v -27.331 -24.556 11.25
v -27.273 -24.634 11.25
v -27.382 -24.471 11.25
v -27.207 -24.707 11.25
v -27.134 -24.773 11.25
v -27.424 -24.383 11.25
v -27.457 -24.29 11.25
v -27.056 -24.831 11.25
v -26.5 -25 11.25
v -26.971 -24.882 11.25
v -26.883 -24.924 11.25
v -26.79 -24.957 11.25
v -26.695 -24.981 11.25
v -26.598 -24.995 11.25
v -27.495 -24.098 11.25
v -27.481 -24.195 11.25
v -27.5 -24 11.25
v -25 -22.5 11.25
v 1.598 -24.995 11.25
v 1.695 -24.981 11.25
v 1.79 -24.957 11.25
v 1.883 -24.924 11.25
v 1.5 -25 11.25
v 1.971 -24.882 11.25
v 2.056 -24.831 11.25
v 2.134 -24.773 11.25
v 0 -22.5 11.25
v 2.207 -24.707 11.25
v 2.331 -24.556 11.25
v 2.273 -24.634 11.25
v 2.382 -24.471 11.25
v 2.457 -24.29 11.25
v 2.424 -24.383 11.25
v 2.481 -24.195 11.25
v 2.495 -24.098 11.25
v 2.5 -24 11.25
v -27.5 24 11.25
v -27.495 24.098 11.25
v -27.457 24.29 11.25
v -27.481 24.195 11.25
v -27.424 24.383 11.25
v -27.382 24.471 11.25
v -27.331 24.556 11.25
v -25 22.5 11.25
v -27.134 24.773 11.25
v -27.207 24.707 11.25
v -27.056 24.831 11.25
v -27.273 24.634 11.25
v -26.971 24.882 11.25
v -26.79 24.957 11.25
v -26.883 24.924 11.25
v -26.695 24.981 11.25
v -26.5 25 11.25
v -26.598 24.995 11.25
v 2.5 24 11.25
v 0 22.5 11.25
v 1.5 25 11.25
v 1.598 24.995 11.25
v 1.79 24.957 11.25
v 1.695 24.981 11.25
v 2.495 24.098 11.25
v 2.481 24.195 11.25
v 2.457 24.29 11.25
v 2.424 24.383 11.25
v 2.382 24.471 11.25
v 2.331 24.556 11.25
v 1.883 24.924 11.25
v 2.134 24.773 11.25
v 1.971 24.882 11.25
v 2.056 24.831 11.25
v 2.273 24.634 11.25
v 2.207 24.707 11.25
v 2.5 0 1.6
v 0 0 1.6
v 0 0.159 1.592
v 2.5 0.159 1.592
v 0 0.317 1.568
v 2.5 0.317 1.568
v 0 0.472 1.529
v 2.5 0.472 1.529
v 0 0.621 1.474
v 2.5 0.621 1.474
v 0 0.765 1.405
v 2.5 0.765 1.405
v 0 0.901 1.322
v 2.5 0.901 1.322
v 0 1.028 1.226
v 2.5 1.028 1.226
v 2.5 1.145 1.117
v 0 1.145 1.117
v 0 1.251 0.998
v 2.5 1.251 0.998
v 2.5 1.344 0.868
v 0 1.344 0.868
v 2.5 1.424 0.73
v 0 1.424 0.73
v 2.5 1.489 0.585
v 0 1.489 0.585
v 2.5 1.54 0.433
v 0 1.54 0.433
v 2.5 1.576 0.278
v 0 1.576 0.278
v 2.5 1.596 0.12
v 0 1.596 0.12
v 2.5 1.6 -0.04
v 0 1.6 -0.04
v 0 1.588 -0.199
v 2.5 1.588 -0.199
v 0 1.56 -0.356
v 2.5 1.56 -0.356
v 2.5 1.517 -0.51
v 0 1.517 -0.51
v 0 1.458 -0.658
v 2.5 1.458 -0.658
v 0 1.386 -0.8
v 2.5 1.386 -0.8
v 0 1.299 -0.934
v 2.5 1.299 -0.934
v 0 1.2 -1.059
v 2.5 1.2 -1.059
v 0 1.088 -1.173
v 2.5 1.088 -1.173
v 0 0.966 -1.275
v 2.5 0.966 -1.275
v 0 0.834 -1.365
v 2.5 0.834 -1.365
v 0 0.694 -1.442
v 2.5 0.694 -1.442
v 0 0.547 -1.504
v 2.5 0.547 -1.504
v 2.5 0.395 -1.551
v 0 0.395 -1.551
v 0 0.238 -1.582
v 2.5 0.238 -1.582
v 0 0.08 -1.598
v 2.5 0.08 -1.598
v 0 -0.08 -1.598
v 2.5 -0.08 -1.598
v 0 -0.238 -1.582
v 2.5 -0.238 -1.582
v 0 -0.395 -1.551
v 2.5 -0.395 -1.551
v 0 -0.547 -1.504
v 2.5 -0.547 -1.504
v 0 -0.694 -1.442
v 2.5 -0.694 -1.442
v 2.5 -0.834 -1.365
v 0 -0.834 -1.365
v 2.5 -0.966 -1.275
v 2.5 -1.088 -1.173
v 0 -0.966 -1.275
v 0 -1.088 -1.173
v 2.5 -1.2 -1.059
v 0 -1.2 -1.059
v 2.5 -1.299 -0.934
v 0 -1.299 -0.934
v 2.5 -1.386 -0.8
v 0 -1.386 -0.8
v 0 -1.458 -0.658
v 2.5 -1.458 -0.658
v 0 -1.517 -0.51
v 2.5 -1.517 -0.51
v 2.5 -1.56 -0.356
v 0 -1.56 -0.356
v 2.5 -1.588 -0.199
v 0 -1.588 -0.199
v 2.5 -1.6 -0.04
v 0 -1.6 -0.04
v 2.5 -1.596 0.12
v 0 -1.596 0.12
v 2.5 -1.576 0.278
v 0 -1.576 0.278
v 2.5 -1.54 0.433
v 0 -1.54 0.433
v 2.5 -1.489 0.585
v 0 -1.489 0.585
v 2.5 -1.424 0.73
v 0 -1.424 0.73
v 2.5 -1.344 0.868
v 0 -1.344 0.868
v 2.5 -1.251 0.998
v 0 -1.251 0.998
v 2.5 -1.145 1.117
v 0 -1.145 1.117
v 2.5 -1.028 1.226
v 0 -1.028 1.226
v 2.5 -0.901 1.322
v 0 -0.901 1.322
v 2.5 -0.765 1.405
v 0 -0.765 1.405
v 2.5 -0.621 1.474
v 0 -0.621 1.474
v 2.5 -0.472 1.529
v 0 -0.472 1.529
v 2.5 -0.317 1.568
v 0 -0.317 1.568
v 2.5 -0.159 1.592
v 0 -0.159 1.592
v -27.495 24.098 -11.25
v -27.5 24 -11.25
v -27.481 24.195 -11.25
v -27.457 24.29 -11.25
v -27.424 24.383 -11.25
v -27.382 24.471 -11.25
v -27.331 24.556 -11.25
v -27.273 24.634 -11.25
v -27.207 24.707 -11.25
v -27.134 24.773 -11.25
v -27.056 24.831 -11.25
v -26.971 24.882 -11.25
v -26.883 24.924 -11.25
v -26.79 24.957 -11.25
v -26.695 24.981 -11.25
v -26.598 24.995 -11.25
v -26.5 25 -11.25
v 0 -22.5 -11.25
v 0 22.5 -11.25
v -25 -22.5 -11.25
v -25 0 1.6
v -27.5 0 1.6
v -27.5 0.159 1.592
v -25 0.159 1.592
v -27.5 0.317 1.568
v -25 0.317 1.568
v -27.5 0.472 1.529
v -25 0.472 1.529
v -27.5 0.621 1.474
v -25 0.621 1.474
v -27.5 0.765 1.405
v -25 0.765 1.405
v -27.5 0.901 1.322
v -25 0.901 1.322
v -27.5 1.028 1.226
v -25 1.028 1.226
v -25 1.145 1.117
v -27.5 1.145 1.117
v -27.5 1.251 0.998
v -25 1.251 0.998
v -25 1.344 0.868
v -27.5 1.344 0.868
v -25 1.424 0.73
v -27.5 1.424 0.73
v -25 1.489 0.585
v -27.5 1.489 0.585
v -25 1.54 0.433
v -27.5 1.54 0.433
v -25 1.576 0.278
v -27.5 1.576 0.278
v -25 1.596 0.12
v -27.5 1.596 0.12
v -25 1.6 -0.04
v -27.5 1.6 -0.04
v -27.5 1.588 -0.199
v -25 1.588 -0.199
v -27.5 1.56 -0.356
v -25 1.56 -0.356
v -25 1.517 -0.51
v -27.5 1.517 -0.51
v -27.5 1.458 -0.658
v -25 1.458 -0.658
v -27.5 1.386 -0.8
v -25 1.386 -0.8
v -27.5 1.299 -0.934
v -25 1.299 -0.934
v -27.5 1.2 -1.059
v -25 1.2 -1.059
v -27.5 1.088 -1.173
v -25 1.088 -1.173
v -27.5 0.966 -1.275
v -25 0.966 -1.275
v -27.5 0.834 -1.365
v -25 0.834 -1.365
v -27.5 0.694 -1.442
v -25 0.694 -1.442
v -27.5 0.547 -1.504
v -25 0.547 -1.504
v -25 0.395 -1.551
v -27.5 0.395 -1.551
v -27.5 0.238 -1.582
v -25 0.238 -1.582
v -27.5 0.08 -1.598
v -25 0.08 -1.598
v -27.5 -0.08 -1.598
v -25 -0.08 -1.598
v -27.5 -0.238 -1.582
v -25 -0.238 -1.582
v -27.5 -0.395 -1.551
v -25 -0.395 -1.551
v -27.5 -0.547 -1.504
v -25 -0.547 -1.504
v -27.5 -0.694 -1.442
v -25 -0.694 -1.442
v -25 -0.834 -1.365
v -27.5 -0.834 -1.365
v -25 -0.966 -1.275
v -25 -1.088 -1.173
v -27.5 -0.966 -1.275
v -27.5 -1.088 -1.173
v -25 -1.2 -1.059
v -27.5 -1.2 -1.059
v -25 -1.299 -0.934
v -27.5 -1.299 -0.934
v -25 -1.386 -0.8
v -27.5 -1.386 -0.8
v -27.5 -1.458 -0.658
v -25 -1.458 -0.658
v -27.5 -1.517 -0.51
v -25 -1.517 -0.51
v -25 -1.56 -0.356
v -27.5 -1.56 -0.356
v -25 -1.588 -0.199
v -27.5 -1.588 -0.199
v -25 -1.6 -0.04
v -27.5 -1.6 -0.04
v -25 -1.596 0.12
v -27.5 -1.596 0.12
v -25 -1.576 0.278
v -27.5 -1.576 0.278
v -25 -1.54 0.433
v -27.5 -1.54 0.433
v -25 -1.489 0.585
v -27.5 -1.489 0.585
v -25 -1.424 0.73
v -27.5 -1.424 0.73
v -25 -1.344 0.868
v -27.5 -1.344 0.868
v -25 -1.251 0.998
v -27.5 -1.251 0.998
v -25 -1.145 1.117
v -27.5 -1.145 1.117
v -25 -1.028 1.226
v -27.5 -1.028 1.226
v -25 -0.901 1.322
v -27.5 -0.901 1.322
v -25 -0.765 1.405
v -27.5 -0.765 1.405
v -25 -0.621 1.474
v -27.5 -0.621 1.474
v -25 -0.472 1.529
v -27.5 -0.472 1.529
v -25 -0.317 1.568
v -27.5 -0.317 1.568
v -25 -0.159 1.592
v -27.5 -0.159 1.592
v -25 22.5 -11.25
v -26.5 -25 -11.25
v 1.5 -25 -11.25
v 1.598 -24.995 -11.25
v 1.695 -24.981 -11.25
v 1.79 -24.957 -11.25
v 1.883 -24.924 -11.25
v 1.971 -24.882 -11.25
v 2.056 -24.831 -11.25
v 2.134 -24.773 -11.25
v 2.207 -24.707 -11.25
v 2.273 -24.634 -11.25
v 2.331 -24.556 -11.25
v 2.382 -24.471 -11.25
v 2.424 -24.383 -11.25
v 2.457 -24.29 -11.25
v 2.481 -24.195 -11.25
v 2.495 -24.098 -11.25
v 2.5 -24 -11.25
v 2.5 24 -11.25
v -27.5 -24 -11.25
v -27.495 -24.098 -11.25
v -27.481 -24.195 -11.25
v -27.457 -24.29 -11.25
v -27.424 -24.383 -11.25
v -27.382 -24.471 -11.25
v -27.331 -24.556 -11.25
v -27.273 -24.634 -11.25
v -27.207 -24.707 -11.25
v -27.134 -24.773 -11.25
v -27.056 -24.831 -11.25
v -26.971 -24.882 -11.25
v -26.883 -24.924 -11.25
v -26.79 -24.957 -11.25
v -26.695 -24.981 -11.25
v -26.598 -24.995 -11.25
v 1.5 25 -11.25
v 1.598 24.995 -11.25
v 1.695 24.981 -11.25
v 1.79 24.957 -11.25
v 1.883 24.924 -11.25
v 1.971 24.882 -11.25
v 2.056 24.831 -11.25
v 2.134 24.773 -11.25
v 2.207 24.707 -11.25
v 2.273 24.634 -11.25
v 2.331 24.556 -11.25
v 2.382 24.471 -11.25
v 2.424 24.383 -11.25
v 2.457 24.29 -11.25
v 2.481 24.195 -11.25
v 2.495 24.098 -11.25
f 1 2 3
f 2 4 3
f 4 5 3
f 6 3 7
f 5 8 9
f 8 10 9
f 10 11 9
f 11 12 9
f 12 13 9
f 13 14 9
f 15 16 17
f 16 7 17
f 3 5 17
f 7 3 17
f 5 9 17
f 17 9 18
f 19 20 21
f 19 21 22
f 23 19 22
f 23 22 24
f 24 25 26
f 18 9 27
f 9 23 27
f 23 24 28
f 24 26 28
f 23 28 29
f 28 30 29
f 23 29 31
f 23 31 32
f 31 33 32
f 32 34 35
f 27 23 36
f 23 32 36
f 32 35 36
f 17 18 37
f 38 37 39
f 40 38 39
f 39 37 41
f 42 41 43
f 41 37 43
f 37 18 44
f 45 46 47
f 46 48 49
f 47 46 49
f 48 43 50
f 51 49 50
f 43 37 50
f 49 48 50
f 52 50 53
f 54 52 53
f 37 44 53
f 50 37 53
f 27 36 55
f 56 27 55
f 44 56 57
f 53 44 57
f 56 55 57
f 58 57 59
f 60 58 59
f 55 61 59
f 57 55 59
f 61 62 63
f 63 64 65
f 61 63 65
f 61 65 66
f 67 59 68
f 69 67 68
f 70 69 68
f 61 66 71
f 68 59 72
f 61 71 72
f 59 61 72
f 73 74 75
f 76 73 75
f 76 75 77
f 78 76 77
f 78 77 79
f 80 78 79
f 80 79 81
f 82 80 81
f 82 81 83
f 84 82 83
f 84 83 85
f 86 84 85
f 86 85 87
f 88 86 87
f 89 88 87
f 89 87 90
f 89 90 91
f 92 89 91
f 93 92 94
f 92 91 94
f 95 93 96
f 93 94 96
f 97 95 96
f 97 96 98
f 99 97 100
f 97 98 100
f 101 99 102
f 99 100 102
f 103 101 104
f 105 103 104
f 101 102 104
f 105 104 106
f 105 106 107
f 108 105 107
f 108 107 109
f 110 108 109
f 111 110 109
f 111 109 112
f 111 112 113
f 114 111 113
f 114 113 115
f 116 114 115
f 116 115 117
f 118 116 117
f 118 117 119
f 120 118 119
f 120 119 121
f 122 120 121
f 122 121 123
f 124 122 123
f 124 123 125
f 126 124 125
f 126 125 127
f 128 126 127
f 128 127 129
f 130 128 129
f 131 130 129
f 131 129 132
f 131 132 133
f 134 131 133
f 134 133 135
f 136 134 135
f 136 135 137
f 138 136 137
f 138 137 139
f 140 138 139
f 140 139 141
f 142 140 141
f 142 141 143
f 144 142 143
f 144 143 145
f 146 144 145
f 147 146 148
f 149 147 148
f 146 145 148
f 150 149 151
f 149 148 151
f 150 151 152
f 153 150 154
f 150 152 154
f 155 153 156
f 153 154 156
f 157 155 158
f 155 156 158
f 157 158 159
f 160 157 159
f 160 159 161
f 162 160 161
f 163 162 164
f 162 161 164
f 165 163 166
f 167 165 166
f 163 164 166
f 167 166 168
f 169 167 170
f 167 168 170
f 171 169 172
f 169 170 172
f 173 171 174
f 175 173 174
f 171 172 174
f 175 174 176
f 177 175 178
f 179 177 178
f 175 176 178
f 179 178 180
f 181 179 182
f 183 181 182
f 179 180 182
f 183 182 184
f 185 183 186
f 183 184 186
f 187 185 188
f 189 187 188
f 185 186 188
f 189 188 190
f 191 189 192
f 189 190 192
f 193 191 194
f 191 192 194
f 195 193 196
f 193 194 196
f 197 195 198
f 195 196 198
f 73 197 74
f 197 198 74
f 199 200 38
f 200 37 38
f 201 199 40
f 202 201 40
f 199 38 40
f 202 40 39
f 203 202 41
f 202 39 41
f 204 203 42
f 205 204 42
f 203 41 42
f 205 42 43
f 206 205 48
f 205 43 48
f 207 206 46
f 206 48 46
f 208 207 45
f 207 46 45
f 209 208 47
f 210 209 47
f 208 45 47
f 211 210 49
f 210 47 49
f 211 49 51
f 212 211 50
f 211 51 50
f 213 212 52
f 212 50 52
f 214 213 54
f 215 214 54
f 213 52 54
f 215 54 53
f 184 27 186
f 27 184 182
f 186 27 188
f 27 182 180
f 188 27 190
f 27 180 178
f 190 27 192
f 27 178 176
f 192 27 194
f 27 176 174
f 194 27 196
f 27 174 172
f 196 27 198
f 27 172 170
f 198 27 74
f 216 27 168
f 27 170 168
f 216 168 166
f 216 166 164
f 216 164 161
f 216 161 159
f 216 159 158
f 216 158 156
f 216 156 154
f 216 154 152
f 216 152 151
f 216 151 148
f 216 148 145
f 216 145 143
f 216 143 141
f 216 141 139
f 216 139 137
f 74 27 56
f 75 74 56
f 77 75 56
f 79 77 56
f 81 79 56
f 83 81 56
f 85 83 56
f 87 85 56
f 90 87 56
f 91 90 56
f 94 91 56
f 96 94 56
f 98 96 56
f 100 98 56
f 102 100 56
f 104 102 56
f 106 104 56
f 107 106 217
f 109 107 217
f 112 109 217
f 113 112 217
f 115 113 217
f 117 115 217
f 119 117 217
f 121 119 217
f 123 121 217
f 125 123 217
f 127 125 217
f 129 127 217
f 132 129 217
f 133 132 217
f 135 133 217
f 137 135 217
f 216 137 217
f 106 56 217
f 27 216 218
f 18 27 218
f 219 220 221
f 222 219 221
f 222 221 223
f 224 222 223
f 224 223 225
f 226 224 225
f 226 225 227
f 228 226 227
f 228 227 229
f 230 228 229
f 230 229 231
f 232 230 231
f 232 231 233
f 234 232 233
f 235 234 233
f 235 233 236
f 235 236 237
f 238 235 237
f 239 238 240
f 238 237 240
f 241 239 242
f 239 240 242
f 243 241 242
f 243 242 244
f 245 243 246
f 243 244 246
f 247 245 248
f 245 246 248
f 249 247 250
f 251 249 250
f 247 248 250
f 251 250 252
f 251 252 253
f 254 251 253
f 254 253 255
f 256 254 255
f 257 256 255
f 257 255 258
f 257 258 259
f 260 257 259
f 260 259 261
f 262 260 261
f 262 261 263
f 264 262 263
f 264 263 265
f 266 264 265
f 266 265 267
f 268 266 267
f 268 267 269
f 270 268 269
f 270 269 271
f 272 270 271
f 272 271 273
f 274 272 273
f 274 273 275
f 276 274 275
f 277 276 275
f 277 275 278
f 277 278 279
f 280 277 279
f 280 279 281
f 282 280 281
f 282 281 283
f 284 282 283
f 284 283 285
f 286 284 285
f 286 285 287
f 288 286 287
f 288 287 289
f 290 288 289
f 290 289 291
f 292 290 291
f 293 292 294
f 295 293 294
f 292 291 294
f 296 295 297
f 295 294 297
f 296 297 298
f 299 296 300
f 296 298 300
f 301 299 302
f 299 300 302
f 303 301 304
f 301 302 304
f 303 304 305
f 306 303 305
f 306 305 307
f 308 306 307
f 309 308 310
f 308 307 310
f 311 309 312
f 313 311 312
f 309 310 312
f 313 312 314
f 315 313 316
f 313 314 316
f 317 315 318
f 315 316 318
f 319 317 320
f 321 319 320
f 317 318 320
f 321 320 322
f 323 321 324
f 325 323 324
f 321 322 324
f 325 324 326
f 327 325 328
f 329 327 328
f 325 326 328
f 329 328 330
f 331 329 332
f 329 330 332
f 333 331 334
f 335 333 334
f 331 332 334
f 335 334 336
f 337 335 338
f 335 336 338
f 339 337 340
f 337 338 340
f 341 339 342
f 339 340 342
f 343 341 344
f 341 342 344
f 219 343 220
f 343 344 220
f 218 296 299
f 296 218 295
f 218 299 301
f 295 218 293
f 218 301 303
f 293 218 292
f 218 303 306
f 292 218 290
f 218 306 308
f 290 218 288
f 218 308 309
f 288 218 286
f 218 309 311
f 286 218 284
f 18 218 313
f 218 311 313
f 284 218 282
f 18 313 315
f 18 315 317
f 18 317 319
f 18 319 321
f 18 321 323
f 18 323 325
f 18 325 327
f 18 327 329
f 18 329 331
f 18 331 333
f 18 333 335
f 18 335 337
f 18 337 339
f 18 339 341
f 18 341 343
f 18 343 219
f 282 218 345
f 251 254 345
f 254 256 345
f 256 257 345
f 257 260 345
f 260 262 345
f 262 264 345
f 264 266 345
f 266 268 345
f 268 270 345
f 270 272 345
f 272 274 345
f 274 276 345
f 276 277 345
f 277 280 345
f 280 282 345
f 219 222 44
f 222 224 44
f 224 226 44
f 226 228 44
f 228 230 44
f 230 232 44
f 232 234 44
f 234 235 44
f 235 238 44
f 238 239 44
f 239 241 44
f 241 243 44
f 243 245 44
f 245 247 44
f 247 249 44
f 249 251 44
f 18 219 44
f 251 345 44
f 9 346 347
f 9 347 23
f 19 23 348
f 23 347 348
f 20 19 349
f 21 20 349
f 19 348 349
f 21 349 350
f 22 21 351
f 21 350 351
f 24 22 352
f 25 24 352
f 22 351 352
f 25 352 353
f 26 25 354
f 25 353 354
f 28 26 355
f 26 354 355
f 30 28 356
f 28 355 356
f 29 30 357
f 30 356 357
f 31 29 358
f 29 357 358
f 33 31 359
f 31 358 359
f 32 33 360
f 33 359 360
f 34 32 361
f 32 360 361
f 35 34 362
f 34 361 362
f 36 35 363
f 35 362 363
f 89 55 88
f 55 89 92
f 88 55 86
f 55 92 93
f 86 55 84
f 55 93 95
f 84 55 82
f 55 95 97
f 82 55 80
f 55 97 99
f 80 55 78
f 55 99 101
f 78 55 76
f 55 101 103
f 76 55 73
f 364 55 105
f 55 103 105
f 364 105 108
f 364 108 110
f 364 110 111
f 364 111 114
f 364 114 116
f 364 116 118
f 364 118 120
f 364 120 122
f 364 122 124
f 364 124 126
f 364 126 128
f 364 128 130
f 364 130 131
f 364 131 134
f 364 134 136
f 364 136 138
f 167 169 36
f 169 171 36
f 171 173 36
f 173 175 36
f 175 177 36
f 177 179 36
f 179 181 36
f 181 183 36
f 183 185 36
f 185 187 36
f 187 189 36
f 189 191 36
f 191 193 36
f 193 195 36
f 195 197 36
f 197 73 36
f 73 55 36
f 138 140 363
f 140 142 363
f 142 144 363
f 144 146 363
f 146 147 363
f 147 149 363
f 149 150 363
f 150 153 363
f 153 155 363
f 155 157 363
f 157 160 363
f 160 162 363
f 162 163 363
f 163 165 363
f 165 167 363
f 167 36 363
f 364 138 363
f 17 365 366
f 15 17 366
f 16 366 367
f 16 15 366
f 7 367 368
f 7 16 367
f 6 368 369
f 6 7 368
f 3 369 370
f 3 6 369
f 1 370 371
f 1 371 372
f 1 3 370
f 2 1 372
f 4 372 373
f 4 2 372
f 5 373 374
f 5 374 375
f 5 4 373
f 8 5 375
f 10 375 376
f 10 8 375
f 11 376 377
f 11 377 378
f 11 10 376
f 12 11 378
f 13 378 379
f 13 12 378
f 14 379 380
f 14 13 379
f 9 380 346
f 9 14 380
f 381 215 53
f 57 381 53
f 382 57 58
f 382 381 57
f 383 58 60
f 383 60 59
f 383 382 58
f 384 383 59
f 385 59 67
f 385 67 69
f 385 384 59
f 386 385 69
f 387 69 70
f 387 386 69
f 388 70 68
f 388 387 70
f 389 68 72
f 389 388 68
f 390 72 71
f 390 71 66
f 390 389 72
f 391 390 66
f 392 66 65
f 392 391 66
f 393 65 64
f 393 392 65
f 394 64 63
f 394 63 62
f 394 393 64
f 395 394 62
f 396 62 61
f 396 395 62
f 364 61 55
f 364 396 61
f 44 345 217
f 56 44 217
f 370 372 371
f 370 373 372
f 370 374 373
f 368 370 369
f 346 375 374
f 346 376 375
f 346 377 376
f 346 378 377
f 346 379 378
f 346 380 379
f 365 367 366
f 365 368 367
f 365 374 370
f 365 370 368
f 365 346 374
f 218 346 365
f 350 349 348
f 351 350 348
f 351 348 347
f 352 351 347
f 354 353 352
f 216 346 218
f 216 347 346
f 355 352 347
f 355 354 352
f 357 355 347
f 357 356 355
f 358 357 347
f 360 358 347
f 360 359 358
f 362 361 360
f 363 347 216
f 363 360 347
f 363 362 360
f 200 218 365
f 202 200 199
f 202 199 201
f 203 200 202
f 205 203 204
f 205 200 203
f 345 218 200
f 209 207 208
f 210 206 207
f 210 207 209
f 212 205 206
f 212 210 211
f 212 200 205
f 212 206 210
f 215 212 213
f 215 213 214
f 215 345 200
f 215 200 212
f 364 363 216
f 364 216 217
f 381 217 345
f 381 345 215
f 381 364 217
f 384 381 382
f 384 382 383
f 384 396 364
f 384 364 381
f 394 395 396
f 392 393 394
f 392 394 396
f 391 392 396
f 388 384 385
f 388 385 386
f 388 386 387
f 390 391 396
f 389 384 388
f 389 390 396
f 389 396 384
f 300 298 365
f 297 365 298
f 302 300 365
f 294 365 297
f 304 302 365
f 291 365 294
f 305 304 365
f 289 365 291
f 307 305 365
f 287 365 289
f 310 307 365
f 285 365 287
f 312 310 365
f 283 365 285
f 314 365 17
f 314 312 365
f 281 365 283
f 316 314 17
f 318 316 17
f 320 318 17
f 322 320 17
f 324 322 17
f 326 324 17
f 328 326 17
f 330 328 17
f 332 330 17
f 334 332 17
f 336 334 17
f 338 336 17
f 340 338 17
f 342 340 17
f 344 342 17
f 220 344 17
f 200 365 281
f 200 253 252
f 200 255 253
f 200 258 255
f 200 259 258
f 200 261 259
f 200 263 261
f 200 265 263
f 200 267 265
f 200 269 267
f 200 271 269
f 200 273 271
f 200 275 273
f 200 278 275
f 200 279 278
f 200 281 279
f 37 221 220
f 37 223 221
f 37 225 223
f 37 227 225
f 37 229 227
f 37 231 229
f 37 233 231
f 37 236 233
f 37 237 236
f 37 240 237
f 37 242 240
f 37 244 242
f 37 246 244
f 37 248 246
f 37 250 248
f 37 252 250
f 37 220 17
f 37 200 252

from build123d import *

# Parameters (mm, degrees)
SKETCH1_W           = 22.5
SKETCH1_H           = 45
BOSS_EXTRUDE1_DEPTH = 2.5
SKETCH2_W           = 27.5
SKETCH2_H           = 22.5
BOSS_EXTRUDE2_DEPTH = 2.5
SKETCH3_W           = 27.5
SKETCH3_H           = 22.5
BOSS_EXTRUDE3_DEPTH = 2.5
SKETCH4_W           = 22.5
SKETCH4_H           = 50
BOSS_EXTRUDE4_DEPTH = 2.5
SKETCH5_R           = 1.6
CUT_EXTRUDE1_DEPTH  = 30
FILLET2_R           = 1
FILLET3_R           = 1


with BuildPart() as part:
    # Sketch1 → Boss-Extrude1 (new body)
    with BuildSketch(Plane(origin=(0, 0, 0), x_dir=(0, 0, -1), z_dir=(1, 0, 0))):
        Rectangle(SKETCH1_W, SKETCH1_H)
    extrude(amount=BOSS_EXTRUDE1_DEPTH)

    # Sketch2 → Boss-Extrude2 (add)
    with BuildSketch(Plane(origin=(0, -22.5, 0), x_dir=(-1, 0, 0), z_dir=(0, -1, 0))):
        with Locations((11.25, 0)):
            Rectangle(SKETCH2_W, SKETCH2_H)
    extrude(amount=BOSS_EXTRUDE2_DEPTH)

    # Sketch3 → Boss-Extrude3 (add)
    with BuildSketch(Plane(origin=(0, 22.5, 0), x_dir=(1, 0, 0), z_dir=(0, 1, 0))):
        with Locations((-11.25, 0)):
            Rectangle(SKETCH3_W, SKETCH3_H)
    extrude(amount=BOSS_EXTRUDE3_DEPTH)

    # Sketch4 → Boss-Extrude4 (add)
    with BuildSketch(Plane.ZY.offset(25)):
        Rectangle(SKETCH4_W, SKETCH4_H)
    extrude(amount=BOSS_EXTRUDE4_DEPTH)

    # Sketch5 → Cut-Extrude1 (cut)
    with BuildSketch(Plane.ZY.offset(27.5)):
        Circle(SKETCH5_R)
    extrude(amount=-CUT_EXTRUDE1_DEPTH, mode=Mode.SUBTRACT)

    # Fillet2
    fillet2_edges = [part.edges().sort_by_distance(p)[0] for p in [
        (2.5, 25, 0),
        (-27.5, 25, 0),
    ]]
    fillet(fillet2_edges, radius=FILLET2_R)

    # Fillet3
    fillet3_edges = [part.edges().sort_by_distance(p)[0] for p in [
        (2.5, -25, 0),
        (-27.5, -25, 0),
    ]]
    fillet(fillet3_edges, radius=FILLET3_R)


solid = part.part
